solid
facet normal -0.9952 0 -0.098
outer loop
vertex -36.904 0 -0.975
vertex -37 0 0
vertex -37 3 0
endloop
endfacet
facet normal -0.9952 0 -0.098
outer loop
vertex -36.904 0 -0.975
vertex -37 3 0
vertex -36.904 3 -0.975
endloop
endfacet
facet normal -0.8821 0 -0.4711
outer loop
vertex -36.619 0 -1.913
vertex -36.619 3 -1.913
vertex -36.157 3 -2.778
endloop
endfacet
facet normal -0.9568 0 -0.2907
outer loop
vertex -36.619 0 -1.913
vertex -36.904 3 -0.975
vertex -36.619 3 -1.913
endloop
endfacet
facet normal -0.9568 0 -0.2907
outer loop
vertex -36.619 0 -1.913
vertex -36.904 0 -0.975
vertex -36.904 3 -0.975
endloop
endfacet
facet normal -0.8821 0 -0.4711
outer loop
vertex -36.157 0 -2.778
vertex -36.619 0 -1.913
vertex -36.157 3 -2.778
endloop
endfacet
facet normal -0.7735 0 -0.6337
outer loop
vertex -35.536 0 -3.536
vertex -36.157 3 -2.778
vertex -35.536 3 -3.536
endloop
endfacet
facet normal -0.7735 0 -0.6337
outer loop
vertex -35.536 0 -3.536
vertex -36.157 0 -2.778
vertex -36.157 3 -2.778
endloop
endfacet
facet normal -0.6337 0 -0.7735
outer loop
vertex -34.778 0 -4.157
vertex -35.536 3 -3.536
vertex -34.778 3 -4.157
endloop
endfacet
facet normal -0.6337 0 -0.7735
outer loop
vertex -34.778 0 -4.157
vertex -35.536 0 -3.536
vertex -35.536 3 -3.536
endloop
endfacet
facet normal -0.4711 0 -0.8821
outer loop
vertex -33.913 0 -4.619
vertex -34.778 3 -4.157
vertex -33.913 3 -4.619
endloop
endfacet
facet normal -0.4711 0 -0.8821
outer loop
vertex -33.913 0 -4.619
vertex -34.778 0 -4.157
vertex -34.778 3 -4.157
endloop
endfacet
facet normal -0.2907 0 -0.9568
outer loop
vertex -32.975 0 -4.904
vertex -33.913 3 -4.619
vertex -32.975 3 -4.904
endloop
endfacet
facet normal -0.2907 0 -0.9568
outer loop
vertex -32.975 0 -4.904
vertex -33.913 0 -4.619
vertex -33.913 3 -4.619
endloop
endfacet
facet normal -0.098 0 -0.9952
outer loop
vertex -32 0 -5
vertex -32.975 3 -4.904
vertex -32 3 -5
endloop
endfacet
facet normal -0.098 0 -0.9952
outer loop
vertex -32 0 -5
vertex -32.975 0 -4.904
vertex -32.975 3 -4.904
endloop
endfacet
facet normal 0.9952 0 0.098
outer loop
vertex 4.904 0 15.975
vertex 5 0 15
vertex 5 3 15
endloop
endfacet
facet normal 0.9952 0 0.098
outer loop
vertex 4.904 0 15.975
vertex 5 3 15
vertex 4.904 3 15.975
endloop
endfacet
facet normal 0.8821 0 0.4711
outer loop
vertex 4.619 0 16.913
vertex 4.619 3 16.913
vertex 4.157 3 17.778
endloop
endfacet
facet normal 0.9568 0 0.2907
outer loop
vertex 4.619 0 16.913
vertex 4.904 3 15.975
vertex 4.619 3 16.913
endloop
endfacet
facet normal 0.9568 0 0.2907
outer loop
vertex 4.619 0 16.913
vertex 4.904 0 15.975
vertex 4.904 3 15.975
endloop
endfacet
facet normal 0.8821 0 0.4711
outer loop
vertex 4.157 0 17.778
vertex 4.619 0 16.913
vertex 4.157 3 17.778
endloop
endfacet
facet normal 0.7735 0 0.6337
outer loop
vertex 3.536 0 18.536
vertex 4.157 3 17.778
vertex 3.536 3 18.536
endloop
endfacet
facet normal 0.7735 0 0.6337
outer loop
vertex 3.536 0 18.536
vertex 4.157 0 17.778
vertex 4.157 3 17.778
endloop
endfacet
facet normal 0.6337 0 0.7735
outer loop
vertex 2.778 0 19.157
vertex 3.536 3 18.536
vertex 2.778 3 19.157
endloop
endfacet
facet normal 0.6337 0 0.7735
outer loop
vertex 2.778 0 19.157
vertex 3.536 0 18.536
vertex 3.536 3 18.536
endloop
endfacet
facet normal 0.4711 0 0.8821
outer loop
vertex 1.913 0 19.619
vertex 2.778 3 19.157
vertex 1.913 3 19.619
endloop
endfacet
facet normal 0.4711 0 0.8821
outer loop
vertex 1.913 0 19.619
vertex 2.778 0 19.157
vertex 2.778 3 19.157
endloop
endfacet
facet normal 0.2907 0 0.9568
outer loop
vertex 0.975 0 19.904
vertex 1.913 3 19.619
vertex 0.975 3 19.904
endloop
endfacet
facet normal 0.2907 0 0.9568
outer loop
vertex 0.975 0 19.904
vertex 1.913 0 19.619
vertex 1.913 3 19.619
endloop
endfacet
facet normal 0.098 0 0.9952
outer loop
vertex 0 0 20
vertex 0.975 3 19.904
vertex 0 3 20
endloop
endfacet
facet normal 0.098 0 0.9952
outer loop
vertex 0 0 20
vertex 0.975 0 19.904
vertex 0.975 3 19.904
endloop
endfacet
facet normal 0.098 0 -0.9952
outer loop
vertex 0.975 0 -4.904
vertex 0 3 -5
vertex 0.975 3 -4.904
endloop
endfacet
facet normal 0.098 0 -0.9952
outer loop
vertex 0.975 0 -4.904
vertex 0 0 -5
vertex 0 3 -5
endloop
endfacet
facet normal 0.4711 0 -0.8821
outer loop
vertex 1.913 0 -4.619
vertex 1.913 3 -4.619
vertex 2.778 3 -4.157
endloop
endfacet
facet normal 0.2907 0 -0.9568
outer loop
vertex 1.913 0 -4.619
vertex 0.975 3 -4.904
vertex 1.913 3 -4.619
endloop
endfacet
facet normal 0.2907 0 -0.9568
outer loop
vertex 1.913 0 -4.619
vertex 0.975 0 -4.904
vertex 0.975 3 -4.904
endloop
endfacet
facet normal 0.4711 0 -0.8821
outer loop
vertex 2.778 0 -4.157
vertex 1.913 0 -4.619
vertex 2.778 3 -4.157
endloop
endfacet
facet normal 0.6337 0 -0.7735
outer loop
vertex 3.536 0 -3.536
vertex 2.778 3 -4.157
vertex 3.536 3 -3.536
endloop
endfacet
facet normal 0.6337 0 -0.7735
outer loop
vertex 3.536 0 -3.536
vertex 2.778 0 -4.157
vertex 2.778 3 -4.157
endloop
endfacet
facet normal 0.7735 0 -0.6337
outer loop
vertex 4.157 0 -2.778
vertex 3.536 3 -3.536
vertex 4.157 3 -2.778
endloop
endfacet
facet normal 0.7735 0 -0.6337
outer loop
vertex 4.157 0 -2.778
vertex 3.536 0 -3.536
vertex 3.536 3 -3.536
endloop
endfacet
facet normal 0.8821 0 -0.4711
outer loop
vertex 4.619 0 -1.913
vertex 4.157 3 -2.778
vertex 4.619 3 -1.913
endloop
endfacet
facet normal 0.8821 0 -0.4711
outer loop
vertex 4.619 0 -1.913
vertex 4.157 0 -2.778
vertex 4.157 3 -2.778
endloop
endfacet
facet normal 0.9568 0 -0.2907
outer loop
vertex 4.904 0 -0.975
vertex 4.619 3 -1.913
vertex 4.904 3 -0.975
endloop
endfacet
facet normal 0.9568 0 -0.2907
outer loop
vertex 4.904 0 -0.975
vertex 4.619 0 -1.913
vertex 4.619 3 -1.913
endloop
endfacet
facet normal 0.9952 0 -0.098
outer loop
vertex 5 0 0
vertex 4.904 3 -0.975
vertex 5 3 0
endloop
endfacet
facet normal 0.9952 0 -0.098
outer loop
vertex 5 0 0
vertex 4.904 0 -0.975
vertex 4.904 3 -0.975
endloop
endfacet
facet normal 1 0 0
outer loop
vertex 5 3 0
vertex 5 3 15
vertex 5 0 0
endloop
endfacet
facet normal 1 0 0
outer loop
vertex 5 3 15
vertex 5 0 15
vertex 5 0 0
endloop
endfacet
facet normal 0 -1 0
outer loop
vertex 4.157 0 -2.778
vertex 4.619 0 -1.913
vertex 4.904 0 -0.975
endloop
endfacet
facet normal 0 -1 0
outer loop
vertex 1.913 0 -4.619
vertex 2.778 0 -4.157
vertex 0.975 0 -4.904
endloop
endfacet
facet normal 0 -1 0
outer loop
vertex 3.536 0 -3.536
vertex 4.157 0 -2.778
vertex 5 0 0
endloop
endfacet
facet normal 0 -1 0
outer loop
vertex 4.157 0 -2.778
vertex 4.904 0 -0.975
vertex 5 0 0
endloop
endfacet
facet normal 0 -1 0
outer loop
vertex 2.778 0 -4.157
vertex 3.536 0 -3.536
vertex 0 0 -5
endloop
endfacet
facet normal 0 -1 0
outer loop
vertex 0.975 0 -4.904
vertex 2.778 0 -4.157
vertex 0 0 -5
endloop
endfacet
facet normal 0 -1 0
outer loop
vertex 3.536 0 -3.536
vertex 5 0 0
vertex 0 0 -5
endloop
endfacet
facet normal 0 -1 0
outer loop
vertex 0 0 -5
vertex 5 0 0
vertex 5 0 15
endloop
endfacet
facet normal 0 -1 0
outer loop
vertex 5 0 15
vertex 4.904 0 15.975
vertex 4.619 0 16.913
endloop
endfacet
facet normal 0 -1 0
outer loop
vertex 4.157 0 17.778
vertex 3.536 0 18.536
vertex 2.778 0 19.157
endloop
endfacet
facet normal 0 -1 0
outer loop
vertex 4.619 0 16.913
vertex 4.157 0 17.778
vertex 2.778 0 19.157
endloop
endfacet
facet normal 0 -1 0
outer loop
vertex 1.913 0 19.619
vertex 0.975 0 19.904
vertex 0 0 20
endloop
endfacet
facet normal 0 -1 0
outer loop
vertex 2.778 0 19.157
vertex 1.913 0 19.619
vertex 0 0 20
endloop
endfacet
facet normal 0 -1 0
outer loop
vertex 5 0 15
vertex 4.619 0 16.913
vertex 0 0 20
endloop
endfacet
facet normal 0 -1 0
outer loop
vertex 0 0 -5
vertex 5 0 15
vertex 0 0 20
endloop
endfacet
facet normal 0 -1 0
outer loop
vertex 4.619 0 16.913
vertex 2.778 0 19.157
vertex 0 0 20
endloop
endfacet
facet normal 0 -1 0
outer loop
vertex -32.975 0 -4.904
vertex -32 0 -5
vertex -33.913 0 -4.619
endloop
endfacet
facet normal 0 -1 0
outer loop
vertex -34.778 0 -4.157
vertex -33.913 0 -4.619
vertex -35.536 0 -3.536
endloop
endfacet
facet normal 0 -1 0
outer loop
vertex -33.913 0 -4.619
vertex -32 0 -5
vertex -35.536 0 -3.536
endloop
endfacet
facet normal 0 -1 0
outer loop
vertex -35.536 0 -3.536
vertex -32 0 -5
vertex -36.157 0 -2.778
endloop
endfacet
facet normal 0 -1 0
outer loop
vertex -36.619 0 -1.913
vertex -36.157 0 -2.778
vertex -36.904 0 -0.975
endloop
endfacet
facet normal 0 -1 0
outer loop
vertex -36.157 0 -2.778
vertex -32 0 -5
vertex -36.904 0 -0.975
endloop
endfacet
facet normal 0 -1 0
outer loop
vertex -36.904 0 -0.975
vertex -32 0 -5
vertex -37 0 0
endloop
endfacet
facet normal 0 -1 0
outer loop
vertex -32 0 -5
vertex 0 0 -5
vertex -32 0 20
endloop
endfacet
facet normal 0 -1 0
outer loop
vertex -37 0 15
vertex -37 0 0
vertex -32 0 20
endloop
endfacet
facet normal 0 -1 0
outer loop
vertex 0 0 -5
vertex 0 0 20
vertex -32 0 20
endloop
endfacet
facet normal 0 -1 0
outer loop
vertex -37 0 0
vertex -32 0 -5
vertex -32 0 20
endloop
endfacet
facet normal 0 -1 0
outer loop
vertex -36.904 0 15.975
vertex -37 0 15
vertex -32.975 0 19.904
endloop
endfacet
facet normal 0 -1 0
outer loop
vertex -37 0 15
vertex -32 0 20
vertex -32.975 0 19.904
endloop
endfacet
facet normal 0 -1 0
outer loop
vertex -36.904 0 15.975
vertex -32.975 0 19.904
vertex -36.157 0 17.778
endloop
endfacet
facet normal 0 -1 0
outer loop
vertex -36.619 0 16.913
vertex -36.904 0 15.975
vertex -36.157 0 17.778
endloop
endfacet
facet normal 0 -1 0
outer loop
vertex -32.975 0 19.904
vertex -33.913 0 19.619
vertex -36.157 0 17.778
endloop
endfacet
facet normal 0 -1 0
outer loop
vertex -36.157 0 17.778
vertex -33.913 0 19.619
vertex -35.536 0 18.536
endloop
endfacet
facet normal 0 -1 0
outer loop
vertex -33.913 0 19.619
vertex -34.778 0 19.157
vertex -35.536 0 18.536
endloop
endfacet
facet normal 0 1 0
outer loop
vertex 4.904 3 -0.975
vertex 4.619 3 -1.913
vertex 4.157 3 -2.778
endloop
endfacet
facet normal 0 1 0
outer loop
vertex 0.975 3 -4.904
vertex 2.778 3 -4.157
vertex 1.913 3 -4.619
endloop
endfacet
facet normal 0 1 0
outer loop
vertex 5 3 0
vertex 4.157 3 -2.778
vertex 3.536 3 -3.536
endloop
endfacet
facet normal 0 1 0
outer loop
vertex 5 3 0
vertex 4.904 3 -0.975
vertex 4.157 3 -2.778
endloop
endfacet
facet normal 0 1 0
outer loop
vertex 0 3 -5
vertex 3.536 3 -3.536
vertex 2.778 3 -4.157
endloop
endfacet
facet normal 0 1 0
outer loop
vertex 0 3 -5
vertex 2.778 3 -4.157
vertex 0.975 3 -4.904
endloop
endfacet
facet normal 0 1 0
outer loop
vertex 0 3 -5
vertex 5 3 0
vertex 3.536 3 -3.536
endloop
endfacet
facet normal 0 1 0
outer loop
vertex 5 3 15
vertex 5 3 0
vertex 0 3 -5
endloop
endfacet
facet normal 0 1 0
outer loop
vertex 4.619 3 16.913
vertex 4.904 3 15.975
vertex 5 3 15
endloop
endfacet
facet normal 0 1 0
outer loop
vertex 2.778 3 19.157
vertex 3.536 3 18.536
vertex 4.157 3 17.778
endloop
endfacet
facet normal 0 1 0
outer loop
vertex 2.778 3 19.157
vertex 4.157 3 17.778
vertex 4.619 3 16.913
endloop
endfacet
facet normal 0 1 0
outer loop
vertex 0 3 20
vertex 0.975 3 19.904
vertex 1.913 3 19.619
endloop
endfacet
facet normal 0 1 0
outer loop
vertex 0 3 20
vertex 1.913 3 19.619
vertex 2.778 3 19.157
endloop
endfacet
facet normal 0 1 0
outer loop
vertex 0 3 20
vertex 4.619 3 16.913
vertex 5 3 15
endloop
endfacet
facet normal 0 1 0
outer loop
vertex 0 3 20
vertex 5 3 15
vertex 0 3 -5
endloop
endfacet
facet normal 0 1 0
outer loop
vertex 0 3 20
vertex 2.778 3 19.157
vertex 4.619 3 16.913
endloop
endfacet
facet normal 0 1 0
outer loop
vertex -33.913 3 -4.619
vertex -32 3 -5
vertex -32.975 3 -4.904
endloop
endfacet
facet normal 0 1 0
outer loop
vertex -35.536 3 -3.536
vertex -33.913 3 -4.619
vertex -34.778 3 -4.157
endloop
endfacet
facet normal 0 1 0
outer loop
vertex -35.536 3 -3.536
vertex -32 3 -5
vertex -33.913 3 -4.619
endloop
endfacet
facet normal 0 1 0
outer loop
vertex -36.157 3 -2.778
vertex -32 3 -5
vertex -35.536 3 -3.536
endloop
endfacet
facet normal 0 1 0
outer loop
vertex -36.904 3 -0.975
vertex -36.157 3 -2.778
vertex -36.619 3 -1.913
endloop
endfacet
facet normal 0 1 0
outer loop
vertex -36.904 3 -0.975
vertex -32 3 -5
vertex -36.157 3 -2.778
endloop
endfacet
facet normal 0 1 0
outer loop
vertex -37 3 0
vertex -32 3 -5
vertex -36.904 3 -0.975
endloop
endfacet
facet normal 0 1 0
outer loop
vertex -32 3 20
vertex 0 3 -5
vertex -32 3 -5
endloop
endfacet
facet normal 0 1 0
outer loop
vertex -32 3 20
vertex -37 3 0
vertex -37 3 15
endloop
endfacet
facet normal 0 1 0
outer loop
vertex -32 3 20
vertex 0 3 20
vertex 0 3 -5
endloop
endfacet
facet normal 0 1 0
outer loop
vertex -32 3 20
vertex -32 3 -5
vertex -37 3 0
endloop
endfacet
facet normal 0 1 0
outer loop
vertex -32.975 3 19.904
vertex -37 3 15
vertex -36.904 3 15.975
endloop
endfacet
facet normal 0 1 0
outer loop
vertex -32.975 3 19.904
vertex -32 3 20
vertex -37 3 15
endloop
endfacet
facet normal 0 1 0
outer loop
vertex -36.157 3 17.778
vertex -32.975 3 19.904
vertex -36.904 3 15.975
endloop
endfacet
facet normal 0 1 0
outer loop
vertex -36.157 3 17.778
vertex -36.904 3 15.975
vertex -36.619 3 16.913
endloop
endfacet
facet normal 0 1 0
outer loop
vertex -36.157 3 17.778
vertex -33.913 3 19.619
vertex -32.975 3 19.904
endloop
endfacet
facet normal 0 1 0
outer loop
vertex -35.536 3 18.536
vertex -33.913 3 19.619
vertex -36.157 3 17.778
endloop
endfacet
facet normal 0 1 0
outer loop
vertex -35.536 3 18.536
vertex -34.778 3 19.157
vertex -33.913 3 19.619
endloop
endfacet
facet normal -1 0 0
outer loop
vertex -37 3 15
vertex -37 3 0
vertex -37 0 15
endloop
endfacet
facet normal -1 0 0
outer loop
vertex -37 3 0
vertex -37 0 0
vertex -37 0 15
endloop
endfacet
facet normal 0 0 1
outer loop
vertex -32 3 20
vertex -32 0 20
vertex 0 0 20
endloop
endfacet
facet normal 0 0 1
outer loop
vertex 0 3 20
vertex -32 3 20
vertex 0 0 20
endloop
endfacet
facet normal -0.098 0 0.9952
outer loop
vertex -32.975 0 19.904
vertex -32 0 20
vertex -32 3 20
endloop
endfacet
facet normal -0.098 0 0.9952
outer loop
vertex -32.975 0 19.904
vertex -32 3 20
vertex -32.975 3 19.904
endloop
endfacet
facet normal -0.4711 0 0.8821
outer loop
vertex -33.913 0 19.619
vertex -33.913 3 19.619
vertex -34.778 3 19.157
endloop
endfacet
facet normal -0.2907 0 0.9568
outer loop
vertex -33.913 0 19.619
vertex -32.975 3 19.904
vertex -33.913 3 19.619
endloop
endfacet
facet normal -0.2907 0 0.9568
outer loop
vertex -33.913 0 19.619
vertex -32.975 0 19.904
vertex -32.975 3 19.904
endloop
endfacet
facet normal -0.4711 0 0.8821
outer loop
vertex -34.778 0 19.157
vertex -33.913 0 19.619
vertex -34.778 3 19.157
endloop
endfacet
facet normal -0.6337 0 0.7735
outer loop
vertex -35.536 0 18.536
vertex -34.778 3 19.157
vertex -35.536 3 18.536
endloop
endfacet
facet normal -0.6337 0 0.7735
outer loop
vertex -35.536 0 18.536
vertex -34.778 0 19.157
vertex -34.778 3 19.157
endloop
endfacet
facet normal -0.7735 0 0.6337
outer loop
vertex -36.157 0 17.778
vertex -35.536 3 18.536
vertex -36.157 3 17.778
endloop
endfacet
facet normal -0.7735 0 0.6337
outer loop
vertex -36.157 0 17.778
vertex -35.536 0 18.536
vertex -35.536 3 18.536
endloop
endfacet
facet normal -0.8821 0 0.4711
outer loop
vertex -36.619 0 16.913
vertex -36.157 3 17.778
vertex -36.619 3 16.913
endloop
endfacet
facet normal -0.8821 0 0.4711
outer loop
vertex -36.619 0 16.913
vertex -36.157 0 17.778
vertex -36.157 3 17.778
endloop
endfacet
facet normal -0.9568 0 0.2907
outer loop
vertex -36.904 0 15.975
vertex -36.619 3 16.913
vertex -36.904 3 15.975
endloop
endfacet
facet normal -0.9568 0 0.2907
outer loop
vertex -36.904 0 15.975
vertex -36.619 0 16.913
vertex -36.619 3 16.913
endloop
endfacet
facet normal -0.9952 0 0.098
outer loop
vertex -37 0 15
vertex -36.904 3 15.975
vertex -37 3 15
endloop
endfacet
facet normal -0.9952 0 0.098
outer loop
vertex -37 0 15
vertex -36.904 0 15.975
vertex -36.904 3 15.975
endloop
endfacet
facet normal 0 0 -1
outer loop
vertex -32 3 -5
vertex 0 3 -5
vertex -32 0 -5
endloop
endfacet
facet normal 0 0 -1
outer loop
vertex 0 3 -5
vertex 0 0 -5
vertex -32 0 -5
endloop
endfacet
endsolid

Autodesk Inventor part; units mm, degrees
ref_plane "YZ Plane" through (0, 0, 0) normal (1, 0, 0) x (0, 1, 0)
ref_plane "XZ Plane" through (0, 0, 0) normal (0, 1, 0) x (-1, 0, 0)
ref_plane "XY Plane" through (0, 0, 0) normal (0, 0, 1) x (1, 0, 0)
sketch "Sketch1" plane through (0, 0, 0) normal (0, 1, 0) x (-1, 0, 0)
  line L0 (0, -5) -> (32, -5)
  line L1 (37, 0) -> (37, 15)
  line L2 (32, 20) -> (0, 20)
  line L3 (-5, 15) -> (-5, 0)
  arc A0 (0, 20) -> (-5, 15) centre (0, 15) ccw
  arc A1 (37, 15) -> (32, 20) centre (32, 15) ccw
  arc A2 (32, -5) -> (37, 0) centre (32, 0) ccw
  arc A3 (-5, 0) -> (0, -5) centre (0, 0) ccw
  point P0 (0, 0)
  point P1 (-5, -5)
  point P2 (37, -5)
  point P3 (-5, 20)
  dimension "d0" = 5
  dimension "d1" = 42
  dimension "d2" = 25
  dimension "d3" = 5
  dimension "d4" = 5
extrude "Extrusion1" add sketch "Sketch1" along normal blind 3
properties part number "Bottom Block"
